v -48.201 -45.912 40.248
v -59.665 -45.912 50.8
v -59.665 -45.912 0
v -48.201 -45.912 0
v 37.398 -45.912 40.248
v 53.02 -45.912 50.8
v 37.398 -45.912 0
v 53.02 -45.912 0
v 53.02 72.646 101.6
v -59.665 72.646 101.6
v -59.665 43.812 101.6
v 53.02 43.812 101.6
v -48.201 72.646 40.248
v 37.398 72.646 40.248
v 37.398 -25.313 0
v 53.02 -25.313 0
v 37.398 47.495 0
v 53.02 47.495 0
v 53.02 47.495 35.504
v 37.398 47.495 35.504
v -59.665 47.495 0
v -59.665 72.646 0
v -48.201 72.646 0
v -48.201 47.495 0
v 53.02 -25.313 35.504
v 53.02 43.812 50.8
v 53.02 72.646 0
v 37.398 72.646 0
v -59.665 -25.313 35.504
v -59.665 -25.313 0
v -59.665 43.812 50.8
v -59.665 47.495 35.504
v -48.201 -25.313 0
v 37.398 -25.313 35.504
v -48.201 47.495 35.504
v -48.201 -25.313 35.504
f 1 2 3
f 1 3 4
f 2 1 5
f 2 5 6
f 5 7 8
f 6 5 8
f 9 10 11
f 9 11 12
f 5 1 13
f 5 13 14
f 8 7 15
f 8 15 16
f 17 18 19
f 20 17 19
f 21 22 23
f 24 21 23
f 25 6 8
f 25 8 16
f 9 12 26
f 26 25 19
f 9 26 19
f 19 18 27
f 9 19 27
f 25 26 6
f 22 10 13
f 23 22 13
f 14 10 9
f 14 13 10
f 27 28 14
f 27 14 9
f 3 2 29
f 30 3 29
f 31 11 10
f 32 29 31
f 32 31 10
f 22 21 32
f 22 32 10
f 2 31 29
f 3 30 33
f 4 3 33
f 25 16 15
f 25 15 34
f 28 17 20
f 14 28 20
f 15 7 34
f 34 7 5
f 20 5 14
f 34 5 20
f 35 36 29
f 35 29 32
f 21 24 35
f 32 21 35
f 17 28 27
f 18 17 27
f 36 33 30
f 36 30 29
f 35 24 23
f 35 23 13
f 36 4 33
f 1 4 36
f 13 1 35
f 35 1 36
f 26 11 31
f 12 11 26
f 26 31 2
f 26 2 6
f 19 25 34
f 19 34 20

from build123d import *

# Parameters (mm, degrees)
F0_W     = 112.6851290464
F0_H     = 118.5585707426
F1_DEPTH = 101.6
F2_W     = 112.6851290464
F2_H     = 89.7236950696
F3_DEPTH = 50.8
F4_W     = 85.5996385217
F4_H     = 40.2484461665
F5_DEPTH = 127
F6_W     = 72.8077031672
F6_H     = 35.5043448508
F7_DEPTH = 127


with BuildPart() as f1:
    # F0 (on Top) → F1 (new body)
    with BuildSketch(Plane.XY):
        with Locations((-3.3229105175, 13.3671686053)):
            Rectangle(F0_W, F0_H)
    extrude(amount=F1_DEPTH)

    # F2 (on face) → F3 (cut)
    with BuildSketch(Plane.XY.offset(101.6)):
        with Locations((-3.3229105175, -1.0502692312)):
            Rectangle(F2_W, F2_H)
    extrude(amount=-F3_DEPTH, mode=Mode.SUBTRACT)

    # F4 (on face) → F5 (cut)
    with BuildSketch(Plane.XZ.offset(45.912116766)):
        with Locations((-5.4014250636, 20.1242230833)):
            Rectangle(F4_W, F4_H)
    extrude(amount=-F5_DEPTH, mode=Mode.SUBTRACT)

    # F6 (on face) → F7 (cut)
    with BuildSketch(Plane.YZ.offset(53.0196540058)):
        with Locations((11.0908616334, 17.7521724254)):
            Rectangle(F6_W, F6_H)
    extrude(amount=-F7_DEPTH, mode=Mode.SUBTRACT)


solid = f1.part
